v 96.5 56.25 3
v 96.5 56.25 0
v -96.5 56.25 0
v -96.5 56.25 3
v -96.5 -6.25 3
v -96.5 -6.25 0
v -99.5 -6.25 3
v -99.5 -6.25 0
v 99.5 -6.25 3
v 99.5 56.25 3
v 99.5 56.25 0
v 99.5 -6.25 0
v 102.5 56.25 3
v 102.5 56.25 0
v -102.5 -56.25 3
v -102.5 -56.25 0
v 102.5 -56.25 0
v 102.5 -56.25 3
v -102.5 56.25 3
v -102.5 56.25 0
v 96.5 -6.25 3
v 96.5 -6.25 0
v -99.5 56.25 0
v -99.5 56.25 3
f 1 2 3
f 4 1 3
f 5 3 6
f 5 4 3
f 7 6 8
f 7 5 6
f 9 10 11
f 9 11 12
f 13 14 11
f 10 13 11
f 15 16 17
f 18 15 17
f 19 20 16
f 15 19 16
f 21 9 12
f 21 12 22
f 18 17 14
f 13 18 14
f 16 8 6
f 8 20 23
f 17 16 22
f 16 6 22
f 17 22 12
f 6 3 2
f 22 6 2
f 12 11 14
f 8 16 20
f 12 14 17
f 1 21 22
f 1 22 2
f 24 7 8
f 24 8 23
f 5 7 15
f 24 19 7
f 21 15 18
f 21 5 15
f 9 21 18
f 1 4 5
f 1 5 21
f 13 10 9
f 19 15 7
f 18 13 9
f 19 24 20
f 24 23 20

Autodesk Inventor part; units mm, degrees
ref_plane "YZ Plane" through (0, 0, 0) normal (1, 0, 0) x (0, 1, 0)
ref_plane "XZ Plane" through (0, 0, 0) normal (0, 1, 0) x (-1, 0, 0)
ref_plane "XY Plane" through (0, 0, 0) normal (0, 0, 1) x (1, 0, 0)
sketch "Sketch1" plane through (0, 0, 0) normal (0, 0, 1) x (1, 0, 0)
  line L0 (-102.5, -56.25) -> (102.5, -56.25)
  line L1 (102.5, -56.25) -> (102.5, 56.25)
  line L2 (102.5, 56.25) -> (-102.5, 56.25)
  line L3 (-102.5, 56.25) -> (-102.5, -56.25)
  line L4 (-102.5, -56.25) -> (102.5, 56.25) construction
  line L5 (102.5, -56.25) -> (-102.5, 56.25) construction
  line L6 (-20.5, 56.25) -> (20.5, 56.25)
  line L7 (20.5, 56.25) -> (20.5, 50.25)
  line L8 (20.5, 50.25) -> (-20.5, 50.25)
  line L9 (-20.5, 50.25) -> (-20.5, 56.25)
  point P0 (0, 0)
  point P1 (0, 56.25)
  point P2 (0, 56.25)
  point P3 (20.5, 56.25)
  dimension "d0" = 41
  dimension "d1" = 6
  dimension "d2" = 205
  dimension "d3" = 112.5
extrude "Plate1" add sketch "Sketch1" along normal blind 3
sketch "Sketch2" plane through (0, 0, 3) normal (0, 0, 1) x (1, 0, 0)
  line L0 (-102.5, 56.25) -> (102.5, 56.25) projected
  line L1 (-99.5, 56.25) -> (-96.5, 56.25)
  line L2 (-96.5, 56.25) -> (-96.5, -6.25)
  line L3 (-96.5, -6.25) -> (-99.5, -6.25)
  line L4 (-99.5, -6.25) -> (-99.5, 56.25)
  line L5 (-102.5, -56.25) -> (-102.5, 56.25) projected
  line L6 (102.5, -56.25) -> (-102.5, -56.25) projected
  point P0 (0, 0)
  point P1 (-20.5, 56.25)
  dimension "d5" = 3
  dimension "d6" = 3
  dimension "d8" = 50
extrude "Cut1" cut sketch "Sketch2" against normal blind 3
mirror "Mirror1" about plane through (0, 0, 0) normal (1, 0, 0) of "Cut1"
equation "\"d9\" = Thickness"
equation "\"d4\" = Thickness"
equation "\"BendRadius\" = Thickness"
equation "\"BendReliefWidth\" = Thickness"
equation "\"BendReliefDepth\" = 0.5 * Thickness"
equation "\"CornerReliefSize\" = 4 * Thickness"
equation "\"MinimumRemnant\" = 2 * Thickness"
equation "\"TransitionRadius\" = BendRadius"
equation "\"JacobiRadiusSize\" = BendRadius"
equation "\"GapSize\" = Thickness"
equation "\"Thickness\" = 3"
properties part number "Finishing Sheets .2  ( Upper )"
